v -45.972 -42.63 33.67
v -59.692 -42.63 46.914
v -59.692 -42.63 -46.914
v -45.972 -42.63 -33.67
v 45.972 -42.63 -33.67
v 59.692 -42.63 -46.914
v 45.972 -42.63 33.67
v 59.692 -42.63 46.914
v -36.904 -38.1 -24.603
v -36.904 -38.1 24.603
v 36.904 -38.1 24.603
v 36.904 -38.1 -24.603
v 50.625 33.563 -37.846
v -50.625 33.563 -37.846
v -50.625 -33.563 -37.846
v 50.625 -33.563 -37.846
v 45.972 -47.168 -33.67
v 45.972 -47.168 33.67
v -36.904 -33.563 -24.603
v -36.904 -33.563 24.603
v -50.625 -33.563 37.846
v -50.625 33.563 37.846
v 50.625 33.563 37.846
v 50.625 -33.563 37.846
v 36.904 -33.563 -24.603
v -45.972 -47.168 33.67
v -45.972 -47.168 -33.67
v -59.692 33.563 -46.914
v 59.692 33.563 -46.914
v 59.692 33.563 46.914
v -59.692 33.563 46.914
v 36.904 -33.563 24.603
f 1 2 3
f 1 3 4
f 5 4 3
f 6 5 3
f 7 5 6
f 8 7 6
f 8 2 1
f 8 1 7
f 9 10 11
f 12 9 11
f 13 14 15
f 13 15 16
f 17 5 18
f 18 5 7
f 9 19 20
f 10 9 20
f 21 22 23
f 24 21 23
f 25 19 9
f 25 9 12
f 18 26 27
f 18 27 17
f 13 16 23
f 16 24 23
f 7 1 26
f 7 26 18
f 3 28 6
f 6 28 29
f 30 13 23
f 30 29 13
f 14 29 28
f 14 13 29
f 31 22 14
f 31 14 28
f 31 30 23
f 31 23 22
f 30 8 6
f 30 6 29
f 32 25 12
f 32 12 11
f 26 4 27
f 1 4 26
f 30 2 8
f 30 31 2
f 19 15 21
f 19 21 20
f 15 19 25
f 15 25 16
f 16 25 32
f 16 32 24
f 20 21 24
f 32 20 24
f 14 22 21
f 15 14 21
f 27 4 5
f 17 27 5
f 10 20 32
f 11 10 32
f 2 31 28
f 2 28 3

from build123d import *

# Parameters (mm, degrees)
F2_DEPTH = 37.846
F1_W     = 73.8076716661
F1_H     = 49.2051169276
F3_DEPTH = 38.1
F4_T     = 9.0678


with BuildPart() as f2:
    # F0 (on Top) → F2 (new body, symmetric)
    with BuildSketch(Plane.XY):
        Polygon((50.624661522, -33.5625614026), (50.624661522, 33.5625614026), (0, 11.3709298894), (0, -11.5776741877), align=None)
        Polygon((0, 11.3709298894), (-50.624661522, 33.5625614026), (-50.624661522, -33.5625614026), (0, -11.5776741877), align=None)
        Polygon((0, 11.3709298894), (50.624661522, 33.5625614026), (-50.624661522, 33.5625614026), align=None)
        Polygon((-50.624661522, -33.5625614026), (50.624661522, -33.5625614026), (0, -11.5776741877), align=None)
    extrude(amount=F2_DEPTH, both=True)

    # F1 (on Front) → F3 (join)
    with BuildSketch(Plane.XZ):
        Rectangle(F1_W, F1_H)
    extrude(amount=F3_DEPTH)

    # F4
    f4_openings = [f2.faces().sort_by_distance(p)[0] for p in [
        (0, 33.562561, 0),
    ]]
    offset(amount=F4_T, openings=f4_openings, kind=Kind.INTERSECTION)


solid = f2.part
